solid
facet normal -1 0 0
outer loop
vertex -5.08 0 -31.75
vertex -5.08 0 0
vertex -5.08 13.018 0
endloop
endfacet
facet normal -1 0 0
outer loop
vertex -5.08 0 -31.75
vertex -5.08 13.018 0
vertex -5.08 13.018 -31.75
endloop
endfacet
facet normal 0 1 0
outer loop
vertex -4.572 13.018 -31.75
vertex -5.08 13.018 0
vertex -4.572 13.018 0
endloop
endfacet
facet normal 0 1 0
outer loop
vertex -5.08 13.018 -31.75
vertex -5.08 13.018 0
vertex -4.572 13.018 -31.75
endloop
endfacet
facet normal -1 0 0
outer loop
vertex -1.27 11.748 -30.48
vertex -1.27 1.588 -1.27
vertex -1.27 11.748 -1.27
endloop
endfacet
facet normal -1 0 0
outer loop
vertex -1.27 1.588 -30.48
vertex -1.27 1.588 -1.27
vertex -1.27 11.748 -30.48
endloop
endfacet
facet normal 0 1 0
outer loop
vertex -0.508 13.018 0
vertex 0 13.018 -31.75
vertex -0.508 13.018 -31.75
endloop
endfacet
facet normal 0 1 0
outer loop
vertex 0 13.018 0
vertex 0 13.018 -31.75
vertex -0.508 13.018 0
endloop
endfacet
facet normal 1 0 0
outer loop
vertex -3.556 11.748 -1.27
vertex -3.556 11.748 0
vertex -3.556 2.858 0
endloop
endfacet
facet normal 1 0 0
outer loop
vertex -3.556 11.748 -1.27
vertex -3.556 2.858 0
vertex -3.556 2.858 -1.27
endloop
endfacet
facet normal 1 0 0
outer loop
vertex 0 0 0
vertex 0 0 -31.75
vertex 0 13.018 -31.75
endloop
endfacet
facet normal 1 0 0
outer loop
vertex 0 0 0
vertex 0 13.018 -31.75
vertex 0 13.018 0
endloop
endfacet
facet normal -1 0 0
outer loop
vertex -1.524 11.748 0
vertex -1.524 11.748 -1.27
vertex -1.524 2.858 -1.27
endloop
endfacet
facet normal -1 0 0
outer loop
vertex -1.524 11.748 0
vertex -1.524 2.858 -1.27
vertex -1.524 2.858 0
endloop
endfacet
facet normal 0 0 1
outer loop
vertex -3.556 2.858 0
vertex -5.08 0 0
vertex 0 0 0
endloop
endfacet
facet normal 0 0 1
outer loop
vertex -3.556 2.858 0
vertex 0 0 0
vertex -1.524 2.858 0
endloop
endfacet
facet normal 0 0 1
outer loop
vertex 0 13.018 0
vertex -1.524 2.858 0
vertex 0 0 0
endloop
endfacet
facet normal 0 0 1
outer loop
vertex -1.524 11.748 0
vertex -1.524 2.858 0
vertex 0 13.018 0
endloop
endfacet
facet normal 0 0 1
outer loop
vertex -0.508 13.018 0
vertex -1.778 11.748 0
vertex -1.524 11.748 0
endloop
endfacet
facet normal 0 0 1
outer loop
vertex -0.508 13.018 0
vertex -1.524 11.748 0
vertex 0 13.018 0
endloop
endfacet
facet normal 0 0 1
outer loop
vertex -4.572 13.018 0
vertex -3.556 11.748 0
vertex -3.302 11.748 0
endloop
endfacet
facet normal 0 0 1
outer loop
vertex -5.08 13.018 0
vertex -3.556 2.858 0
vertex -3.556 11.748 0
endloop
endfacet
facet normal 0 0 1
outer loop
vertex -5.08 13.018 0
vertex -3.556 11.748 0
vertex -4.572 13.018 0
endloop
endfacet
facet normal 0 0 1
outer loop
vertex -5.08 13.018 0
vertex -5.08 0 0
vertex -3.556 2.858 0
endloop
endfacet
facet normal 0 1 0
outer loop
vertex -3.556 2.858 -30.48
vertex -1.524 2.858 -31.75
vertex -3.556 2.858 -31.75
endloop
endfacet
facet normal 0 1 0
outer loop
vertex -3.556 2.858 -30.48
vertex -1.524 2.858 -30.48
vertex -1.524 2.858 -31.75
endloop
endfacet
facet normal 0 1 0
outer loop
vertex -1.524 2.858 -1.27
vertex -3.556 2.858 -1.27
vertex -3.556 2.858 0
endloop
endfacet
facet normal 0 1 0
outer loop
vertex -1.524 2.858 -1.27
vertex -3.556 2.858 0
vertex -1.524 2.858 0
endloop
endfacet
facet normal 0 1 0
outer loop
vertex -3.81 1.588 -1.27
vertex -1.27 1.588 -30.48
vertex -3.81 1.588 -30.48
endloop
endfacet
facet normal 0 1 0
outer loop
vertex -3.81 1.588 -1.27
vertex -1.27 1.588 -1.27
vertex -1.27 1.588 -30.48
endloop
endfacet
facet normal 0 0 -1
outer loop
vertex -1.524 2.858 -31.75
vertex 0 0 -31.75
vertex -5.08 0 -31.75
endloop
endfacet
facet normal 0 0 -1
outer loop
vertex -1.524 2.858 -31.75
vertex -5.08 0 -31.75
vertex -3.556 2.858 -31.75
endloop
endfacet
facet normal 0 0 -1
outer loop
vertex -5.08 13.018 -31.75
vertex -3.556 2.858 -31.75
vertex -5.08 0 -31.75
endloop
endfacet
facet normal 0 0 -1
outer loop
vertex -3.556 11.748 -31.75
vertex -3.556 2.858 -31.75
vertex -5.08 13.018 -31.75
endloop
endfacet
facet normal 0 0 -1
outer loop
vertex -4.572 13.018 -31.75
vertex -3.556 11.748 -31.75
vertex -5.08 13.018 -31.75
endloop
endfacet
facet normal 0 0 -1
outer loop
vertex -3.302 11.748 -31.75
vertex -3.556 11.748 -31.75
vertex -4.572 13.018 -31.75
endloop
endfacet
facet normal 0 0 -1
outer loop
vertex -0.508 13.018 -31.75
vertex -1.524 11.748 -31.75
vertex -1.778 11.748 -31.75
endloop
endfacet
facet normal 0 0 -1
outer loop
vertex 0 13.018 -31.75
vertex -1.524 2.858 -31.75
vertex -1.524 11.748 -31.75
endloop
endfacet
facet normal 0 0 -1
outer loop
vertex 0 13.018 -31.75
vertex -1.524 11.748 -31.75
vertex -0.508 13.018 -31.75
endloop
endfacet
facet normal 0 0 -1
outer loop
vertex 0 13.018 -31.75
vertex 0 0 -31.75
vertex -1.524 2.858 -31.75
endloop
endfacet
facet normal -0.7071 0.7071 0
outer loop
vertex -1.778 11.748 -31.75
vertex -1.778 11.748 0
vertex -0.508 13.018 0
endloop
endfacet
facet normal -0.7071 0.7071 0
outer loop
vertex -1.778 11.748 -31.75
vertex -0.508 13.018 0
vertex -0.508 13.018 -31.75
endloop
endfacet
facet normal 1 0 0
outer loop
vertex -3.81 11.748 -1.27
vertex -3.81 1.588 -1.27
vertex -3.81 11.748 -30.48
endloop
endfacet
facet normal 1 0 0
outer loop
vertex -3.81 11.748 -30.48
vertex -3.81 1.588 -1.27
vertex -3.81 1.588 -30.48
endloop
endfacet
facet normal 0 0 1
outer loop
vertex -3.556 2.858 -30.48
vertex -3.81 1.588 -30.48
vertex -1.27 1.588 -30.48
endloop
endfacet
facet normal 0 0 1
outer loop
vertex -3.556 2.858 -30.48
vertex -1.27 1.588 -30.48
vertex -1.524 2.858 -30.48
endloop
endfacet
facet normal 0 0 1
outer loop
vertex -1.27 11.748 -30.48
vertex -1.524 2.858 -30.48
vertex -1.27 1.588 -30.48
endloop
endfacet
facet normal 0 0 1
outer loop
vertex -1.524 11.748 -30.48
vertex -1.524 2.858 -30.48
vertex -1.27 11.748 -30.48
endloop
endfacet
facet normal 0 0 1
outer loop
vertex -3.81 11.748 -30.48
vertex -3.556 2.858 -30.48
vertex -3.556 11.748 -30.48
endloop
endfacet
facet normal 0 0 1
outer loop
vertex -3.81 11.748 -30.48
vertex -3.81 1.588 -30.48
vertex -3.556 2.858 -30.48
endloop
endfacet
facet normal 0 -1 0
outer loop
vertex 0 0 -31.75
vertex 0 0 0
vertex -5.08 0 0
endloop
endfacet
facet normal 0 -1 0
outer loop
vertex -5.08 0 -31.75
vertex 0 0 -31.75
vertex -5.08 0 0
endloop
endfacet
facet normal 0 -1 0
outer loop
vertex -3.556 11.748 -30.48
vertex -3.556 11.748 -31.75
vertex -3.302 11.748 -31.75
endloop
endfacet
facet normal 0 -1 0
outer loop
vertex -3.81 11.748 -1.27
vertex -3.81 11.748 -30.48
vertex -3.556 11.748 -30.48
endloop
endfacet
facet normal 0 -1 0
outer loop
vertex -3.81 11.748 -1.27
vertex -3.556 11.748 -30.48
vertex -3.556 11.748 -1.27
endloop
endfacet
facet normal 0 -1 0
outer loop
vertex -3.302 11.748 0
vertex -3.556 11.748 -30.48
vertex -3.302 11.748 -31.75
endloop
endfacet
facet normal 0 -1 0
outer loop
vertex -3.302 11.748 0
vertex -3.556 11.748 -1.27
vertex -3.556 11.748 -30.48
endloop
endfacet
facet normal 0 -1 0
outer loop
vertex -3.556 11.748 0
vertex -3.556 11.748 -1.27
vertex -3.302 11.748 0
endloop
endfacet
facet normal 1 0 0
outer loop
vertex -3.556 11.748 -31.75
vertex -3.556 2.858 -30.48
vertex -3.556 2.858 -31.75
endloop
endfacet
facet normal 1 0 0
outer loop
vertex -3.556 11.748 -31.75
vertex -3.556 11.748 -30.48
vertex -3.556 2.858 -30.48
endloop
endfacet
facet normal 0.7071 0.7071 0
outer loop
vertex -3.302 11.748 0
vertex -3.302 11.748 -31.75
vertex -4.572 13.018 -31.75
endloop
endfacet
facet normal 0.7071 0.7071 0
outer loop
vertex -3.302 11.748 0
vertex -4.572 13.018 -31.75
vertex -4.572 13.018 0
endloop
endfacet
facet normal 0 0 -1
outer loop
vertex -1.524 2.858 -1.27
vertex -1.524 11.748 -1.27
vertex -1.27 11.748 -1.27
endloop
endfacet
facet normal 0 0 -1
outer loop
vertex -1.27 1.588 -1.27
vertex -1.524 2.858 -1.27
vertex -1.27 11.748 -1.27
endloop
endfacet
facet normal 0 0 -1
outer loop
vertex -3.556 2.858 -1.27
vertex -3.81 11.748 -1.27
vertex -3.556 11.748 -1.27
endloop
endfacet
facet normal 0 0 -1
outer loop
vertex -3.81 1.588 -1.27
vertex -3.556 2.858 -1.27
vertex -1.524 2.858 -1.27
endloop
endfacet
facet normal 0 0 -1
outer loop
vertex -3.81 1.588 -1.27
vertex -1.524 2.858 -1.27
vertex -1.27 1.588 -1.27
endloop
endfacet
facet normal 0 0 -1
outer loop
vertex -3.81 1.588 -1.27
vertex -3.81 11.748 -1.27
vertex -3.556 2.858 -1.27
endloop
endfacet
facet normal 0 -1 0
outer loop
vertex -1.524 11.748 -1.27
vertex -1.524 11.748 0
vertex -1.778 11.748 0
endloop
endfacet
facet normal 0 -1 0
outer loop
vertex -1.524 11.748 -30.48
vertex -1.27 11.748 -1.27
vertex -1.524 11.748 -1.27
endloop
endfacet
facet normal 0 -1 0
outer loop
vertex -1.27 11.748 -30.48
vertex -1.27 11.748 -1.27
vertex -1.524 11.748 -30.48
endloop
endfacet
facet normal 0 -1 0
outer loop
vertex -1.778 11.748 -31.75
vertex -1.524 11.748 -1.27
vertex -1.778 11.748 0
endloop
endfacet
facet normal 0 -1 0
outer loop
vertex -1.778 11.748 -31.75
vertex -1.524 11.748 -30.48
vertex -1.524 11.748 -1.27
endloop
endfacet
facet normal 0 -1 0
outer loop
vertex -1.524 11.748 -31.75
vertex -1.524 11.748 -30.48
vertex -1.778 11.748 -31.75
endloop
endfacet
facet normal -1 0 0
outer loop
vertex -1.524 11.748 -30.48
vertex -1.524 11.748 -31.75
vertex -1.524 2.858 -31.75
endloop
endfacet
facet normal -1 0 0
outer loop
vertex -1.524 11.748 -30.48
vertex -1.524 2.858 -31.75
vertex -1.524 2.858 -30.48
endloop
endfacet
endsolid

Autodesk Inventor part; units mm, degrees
ref_plane "YZ Plane" through (0, 0, 0) normal (1, 0, 0) x (0, 1, 0)
sketch "Sketch1" plane through (0, 0, 0) normal (0, 1, 0) x (-1, 0, 0)
  line L0 (0, 0) -> (5.08, 0)
  line L1 (5.08, 0) -> (5.08, -31.75)
  line L2 (5.08, -31.75) -> (0, -31.75)
  line L3 (0, -31.75) -> (0, 0)
  dimension "d0" = 5.08
  dimension "d1" = 31.75
extrude "Extrusion1" add sketch "Sketch1" along normal blind 1.5875
sketch "Sketch6" plane through (0, 1.5875, 0) normal (0, 1, 0) x (1, 0, 0)
  line L0 (-5.08, 0) -> (0, 0) projected
  line L1 (0, 31.75) -> (-5.08, 31.75) projected
  line L2 (0, 0) -> (-1.27, 0)
  line L3 (-1.27, 0) -> (-1.27, 31.75)
  line L4 (-1.27, 31.75) -> (0, 31.75)
  line L5 (0, 31.75) -> (0, 0)
  line L6 (-5.08, 31.75) -> (-5.08, 0) projected
  line L7 (-5.08, 0) -> (-3.81, 0)
  line L8 (-3.81, 0) -> (-3.81, 31.75)
  line L9 (-3.81, 31.75) -> (-5.08, 31.75)
  line L10 (-5.08, 31.75) -> (-5.08, 0)
  dimension "d19" = 31.75
  dimension "d20" = 1.27
  dimension "d21" = 31.75
  dimension "d22" = 1.27
extrude "Extrusion7" add sketch "Sketch6" along normal blind 11.43 contours L6 L1 L8 L0 | L3 L1 L5 L0
sketch "Sketch7" plane through (0, 1.5875, 0) normal (0, 1, 0) x (1, 0, 0)
  line L0 (-3.81, 0) -> (-1.27, 0) projected
  line L1 (-3.81, 31.75) -> (-3.81, 0) projected
  line L2 (-1.27, 0) -> (-3.81, 0)
  line L3 (-3.81, 0) -> (-3.81, 1.27)
  line L4 (-3.81, 1.27) -> (-1.27, 1.27)
  line L5 (-1.27, 1.27) -> (-1.27, 0)
  point P0 (0, 0)
  dimension "d25" = 1.27
extrude "Extrusion8" add sketch "Sketch7" along normal blind 1.27
sketch "Sketch8" plane through (-1.27, 1.5875, -31.75) normal (-1, 0, 0) x (0, 0, 1)
  line L0 (0, 11.43) -> (31.75, 11.43) projected
  line L1 (0, 11.43) -> (31.75, 11.43)
  line L2 (31.75, 11.43) -> (31.75, 10.16)
  line L3 (31.75, 10.16) -> (0, 10.16)
  line L4 (0, 10.16) -> (0, 11.43)
  point P0 (31.75, -1.5875)
  dimension "d28" = 31.75
  dimension "d29" = 1.27
extrude "Extrusion9" add sketch "Sketch8" along normal blind 0.508
chamfer "Chamfer1" distance 1.27 angle 45 1 edges at (-1.778, 13.0175, -15.875)
sketch "Sketch9" plane through (-1.27, 1.5875, -31.75) normal (-1, 0, 0) x (0, 0, 1)
  line L0 (30.48, 1.27) -> (31.75, 1.27) projected
  line L1 (31.75, 1.27) -> (30.48, 1.27)
  line L2 (30.48, 1.27) -> (30.48, 10.16)
  line L3 (30.48, 10.16) -> (31.75, 10.16)
  line L4 (31.75, 10.16) -> (31.75, 1.27)
  point P0 (31.75, -1.5875)
  dimension "d35" = 1.27
  dimension "d36" = 8.89
extrude "Extrusion10" add sketch "Sketch9" along normal blind 0.254
ref_plane "Work Plane5" through (-5.08, 0, -15.875) normal (0, 0, 1) x (1, 0, 0)
ref_plane "Work Plane6" through (-2.54, 0, -31.75) normal (-1, 0, 0) x (0, 0, 1)
mirror "Mirror4" about plane through (-2.54, 0, -31.75) normal (-1, 0, 0) of "Extrusion9", "Chamfer1", "Extrusion10"
mirror "Mirror5" about plane through (-5.08, 0, -15.875) normal (0, 0, 1) of "Extrusion10", "Extrusion8"
sketch "Sketch10" plane through (-3.81, 1.5875, -1.27) normal (1, 0, 0) x (0, 0, -1)
  line L0 (30.48, 1.27) -> (29.21, 1.27)
  line L1 (29.21, 1.27) -> (29.21, 10.16)
  line L2 (29.21, 10.16) -> (30.48, 10.16)
  line L3 (30.48, 10.16) -> (30.48, 1.27)
  point P0 (-1.27, -1.5875)
  dimension "d39" = 1.27
  dimension "d40" = 8.89
extrude "Extrusion11" add sketch "Sketch10" along normal blind 0.254
equation "\"d21\" = d19"
equation "\"d22\" = d20"
properties part number "cord holder"
